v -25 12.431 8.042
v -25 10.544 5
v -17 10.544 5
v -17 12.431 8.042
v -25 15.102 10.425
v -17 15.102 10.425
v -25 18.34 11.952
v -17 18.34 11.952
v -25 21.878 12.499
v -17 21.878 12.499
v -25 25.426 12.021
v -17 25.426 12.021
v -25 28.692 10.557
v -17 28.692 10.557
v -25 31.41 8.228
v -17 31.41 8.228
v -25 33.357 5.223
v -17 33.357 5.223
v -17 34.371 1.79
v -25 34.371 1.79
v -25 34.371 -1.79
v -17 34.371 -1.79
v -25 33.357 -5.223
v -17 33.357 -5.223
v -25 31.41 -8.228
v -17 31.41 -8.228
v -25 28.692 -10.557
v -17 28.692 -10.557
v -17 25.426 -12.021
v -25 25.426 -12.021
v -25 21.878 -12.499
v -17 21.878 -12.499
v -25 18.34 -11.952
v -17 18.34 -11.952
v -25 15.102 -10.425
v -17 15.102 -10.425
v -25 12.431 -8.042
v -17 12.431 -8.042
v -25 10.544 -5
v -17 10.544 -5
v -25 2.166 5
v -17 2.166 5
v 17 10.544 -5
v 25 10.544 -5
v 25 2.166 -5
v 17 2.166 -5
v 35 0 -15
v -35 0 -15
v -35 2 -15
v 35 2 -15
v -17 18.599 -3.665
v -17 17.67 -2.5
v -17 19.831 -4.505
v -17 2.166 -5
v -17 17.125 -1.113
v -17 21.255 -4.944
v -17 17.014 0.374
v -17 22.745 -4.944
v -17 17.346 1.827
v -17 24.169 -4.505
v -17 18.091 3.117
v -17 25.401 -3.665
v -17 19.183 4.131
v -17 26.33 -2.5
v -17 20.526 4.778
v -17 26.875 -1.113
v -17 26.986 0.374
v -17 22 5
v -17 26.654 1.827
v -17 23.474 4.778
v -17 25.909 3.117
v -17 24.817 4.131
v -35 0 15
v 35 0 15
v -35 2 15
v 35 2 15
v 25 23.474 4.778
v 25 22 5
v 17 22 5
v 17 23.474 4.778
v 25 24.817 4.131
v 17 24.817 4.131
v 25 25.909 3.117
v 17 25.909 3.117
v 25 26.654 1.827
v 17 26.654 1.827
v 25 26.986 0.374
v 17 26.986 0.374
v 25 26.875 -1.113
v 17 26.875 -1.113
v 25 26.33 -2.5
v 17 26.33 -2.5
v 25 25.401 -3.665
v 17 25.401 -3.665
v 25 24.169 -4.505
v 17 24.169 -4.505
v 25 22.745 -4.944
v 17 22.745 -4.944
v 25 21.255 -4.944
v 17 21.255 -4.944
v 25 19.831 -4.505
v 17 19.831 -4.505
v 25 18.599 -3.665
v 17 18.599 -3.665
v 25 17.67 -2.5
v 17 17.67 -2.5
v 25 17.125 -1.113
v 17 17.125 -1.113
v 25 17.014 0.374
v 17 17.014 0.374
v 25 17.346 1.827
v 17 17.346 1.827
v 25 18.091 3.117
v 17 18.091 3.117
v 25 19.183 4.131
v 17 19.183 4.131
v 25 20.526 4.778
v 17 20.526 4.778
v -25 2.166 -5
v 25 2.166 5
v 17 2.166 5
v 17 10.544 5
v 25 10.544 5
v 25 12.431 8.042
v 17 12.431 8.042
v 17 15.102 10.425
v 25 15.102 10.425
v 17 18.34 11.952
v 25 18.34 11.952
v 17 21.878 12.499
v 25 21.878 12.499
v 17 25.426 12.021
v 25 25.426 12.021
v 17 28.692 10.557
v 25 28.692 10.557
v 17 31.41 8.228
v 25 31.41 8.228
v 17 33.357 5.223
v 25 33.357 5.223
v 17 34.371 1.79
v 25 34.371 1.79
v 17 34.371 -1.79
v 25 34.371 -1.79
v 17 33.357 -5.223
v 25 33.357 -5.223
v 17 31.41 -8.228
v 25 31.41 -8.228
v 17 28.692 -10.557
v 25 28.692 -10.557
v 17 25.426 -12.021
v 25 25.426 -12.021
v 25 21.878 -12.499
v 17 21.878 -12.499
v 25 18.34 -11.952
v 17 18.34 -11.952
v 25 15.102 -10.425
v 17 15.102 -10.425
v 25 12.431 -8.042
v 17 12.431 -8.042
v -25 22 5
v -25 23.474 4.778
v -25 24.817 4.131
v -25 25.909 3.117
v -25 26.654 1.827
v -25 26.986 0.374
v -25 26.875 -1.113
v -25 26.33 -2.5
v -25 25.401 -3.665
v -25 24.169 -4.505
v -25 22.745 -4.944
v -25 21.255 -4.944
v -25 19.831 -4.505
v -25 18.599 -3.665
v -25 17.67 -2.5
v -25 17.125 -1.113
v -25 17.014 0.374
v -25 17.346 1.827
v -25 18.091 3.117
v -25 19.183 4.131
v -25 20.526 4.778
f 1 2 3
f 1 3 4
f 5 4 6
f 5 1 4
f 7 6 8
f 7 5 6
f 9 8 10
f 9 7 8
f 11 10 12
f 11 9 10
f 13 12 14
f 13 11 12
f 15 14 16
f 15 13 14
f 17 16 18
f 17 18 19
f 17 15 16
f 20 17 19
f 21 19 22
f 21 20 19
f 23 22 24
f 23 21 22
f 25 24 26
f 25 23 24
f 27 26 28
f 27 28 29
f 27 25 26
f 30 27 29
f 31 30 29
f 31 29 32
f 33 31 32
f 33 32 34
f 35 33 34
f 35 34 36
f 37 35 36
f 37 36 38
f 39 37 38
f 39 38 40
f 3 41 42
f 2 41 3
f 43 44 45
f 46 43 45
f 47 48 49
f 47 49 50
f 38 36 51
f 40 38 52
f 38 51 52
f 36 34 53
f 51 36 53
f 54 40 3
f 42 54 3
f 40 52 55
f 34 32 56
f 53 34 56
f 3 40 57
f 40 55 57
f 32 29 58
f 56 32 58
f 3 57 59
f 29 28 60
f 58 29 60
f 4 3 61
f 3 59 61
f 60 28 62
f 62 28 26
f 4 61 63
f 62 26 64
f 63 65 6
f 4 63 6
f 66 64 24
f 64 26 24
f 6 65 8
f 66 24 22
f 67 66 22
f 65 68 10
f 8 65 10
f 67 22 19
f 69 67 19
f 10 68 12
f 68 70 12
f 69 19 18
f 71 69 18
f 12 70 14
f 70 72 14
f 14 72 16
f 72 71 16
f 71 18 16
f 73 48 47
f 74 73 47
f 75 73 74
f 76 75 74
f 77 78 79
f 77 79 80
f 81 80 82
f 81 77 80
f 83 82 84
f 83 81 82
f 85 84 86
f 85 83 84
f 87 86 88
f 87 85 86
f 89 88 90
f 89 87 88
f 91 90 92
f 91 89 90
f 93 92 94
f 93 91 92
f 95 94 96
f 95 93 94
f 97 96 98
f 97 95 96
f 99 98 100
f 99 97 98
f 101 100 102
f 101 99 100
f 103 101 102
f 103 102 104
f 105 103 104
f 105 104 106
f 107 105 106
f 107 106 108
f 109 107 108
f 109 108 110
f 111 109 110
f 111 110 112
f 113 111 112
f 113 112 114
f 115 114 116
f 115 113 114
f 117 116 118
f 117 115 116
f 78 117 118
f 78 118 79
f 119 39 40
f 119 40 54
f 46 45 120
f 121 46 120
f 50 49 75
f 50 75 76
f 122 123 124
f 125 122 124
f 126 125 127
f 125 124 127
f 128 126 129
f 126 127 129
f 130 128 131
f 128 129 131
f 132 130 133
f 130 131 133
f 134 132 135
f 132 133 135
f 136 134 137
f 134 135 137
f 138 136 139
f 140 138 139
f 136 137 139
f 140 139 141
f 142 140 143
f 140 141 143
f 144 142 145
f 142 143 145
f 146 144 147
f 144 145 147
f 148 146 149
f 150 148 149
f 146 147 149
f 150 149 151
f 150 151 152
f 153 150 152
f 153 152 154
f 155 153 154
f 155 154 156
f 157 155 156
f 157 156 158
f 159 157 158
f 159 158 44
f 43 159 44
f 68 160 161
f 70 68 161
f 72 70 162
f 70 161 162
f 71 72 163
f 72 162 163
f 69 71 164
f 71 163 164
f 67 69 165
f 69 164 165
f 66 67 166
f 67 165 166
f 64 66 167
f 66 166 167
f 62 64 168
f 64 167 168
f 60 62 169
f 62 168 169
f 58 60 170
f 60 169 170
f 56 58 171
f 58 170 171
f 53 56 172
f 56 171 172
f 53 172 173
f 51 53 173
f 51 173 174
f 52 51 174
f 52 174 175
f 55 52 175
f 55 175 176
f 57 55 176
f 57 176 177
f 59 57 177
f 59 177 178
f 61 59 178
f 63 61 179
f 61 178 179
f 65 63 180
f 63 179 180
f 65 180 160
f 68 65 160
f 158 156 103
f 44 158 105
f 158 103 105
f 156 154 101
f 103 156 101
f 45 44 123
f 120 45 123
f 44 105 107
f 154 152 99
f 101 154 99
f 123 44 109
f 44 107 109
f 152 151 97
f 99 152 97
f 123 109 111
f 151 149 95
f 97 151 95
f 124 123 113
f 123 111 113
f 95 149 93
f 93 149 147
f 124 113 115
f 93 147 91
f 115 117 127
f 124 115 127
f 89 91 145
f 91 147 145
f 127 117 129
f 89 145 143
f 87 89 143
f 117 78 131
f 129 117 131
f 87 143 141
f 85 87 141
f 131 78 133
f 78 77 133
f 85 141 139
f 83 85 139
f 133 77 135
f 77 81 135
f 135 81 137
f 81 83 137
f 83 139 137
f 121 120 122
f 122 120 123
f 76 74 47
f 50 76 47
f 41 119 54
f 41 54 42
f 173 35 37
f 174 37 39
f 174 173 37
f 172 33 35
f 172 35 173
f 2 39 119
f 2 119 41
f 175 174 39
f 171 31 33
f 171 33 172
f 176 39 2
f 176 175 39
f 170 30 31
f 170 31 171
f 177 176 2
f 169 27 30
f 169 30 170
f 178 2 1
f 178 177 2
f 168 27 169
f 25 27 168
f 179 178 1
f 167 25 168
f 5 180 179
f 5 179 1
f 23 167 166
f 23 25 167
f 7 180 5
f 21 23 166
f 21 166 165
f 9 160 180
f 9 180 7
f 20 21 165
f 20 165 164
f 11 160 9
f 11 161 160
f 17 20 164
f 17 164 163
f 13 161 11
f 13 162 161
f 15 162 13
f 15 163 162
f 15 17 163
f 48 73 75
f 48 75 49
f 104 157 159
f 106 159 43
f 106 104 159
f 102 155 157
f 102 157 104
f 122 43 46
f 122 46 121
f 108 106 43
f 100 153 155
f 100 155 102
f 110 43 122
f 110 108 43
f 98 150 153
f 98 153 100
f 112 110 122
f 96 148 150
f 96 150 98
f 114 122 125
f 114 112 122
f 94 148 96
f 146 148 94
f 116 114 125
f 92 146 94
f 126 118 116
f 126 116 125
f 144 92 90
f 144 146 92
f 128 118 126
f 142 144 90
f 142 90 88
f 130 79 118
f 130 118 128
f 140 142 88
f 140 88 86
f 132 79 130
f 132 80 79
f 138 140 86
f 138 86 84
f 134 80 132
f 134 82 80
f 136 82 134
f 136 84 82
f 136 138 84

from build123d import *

# Parameters (mm, degrees)
SKETCH1_W           = 70
SKETCH1_H           = 30
BOSS_EXTRUDE1_DEPTH = 2
SKETCH2_R           = 5
BOSS_EXTRUDE2_DEPTH = 8


with BuildPart() as part:
    # Sketch1 → Boss-Extrude1 (new body)
    with BuildSketch(Plane(origin=(0, 0, 0), x_dir=(1, 0, 0), z_dir=(0, 1, 0))):
        Rectangle(SKETCH1_W, SKETCH1_H)
    extrude(amount=BOSS_EXTRUDE1_DEPTH)


with BuildPart() as body_2:
    # Sketch2 → Boss-Extrude2 (new body)
    with BuildSketch(Plane.ZY.offset(25)):
        with BuildLine():
            Line((-5, 10.543560763), (-5, 7.057167062))
            Line((-5, 7.057167062), (-5, 2.166493233))
            Line((-5, 2.166493233), (5, 2.166493233))
            Line((5, 2.166493233), (5, 7.057167062))
            Line((5, 7.057167062), (5, 10.543560763))
            ThreePointArc((5, 10.543560763), (0, 34.5), (-5, 10.543560763))
        make_face()
        with Locations((0, 22)):
            Circle(SKETCH2_R, mode=Mode.SUBTRACT)
    extrude(amount=-BOSS_EXTRUDE2_DEPTH)


with BuildPart() as body_3:
    # Mirror3: mirrored copy
    add(body_2.part.mirror(Plane.ZY))


solid = Compound([part.part, body_2.part, body_3.part])
